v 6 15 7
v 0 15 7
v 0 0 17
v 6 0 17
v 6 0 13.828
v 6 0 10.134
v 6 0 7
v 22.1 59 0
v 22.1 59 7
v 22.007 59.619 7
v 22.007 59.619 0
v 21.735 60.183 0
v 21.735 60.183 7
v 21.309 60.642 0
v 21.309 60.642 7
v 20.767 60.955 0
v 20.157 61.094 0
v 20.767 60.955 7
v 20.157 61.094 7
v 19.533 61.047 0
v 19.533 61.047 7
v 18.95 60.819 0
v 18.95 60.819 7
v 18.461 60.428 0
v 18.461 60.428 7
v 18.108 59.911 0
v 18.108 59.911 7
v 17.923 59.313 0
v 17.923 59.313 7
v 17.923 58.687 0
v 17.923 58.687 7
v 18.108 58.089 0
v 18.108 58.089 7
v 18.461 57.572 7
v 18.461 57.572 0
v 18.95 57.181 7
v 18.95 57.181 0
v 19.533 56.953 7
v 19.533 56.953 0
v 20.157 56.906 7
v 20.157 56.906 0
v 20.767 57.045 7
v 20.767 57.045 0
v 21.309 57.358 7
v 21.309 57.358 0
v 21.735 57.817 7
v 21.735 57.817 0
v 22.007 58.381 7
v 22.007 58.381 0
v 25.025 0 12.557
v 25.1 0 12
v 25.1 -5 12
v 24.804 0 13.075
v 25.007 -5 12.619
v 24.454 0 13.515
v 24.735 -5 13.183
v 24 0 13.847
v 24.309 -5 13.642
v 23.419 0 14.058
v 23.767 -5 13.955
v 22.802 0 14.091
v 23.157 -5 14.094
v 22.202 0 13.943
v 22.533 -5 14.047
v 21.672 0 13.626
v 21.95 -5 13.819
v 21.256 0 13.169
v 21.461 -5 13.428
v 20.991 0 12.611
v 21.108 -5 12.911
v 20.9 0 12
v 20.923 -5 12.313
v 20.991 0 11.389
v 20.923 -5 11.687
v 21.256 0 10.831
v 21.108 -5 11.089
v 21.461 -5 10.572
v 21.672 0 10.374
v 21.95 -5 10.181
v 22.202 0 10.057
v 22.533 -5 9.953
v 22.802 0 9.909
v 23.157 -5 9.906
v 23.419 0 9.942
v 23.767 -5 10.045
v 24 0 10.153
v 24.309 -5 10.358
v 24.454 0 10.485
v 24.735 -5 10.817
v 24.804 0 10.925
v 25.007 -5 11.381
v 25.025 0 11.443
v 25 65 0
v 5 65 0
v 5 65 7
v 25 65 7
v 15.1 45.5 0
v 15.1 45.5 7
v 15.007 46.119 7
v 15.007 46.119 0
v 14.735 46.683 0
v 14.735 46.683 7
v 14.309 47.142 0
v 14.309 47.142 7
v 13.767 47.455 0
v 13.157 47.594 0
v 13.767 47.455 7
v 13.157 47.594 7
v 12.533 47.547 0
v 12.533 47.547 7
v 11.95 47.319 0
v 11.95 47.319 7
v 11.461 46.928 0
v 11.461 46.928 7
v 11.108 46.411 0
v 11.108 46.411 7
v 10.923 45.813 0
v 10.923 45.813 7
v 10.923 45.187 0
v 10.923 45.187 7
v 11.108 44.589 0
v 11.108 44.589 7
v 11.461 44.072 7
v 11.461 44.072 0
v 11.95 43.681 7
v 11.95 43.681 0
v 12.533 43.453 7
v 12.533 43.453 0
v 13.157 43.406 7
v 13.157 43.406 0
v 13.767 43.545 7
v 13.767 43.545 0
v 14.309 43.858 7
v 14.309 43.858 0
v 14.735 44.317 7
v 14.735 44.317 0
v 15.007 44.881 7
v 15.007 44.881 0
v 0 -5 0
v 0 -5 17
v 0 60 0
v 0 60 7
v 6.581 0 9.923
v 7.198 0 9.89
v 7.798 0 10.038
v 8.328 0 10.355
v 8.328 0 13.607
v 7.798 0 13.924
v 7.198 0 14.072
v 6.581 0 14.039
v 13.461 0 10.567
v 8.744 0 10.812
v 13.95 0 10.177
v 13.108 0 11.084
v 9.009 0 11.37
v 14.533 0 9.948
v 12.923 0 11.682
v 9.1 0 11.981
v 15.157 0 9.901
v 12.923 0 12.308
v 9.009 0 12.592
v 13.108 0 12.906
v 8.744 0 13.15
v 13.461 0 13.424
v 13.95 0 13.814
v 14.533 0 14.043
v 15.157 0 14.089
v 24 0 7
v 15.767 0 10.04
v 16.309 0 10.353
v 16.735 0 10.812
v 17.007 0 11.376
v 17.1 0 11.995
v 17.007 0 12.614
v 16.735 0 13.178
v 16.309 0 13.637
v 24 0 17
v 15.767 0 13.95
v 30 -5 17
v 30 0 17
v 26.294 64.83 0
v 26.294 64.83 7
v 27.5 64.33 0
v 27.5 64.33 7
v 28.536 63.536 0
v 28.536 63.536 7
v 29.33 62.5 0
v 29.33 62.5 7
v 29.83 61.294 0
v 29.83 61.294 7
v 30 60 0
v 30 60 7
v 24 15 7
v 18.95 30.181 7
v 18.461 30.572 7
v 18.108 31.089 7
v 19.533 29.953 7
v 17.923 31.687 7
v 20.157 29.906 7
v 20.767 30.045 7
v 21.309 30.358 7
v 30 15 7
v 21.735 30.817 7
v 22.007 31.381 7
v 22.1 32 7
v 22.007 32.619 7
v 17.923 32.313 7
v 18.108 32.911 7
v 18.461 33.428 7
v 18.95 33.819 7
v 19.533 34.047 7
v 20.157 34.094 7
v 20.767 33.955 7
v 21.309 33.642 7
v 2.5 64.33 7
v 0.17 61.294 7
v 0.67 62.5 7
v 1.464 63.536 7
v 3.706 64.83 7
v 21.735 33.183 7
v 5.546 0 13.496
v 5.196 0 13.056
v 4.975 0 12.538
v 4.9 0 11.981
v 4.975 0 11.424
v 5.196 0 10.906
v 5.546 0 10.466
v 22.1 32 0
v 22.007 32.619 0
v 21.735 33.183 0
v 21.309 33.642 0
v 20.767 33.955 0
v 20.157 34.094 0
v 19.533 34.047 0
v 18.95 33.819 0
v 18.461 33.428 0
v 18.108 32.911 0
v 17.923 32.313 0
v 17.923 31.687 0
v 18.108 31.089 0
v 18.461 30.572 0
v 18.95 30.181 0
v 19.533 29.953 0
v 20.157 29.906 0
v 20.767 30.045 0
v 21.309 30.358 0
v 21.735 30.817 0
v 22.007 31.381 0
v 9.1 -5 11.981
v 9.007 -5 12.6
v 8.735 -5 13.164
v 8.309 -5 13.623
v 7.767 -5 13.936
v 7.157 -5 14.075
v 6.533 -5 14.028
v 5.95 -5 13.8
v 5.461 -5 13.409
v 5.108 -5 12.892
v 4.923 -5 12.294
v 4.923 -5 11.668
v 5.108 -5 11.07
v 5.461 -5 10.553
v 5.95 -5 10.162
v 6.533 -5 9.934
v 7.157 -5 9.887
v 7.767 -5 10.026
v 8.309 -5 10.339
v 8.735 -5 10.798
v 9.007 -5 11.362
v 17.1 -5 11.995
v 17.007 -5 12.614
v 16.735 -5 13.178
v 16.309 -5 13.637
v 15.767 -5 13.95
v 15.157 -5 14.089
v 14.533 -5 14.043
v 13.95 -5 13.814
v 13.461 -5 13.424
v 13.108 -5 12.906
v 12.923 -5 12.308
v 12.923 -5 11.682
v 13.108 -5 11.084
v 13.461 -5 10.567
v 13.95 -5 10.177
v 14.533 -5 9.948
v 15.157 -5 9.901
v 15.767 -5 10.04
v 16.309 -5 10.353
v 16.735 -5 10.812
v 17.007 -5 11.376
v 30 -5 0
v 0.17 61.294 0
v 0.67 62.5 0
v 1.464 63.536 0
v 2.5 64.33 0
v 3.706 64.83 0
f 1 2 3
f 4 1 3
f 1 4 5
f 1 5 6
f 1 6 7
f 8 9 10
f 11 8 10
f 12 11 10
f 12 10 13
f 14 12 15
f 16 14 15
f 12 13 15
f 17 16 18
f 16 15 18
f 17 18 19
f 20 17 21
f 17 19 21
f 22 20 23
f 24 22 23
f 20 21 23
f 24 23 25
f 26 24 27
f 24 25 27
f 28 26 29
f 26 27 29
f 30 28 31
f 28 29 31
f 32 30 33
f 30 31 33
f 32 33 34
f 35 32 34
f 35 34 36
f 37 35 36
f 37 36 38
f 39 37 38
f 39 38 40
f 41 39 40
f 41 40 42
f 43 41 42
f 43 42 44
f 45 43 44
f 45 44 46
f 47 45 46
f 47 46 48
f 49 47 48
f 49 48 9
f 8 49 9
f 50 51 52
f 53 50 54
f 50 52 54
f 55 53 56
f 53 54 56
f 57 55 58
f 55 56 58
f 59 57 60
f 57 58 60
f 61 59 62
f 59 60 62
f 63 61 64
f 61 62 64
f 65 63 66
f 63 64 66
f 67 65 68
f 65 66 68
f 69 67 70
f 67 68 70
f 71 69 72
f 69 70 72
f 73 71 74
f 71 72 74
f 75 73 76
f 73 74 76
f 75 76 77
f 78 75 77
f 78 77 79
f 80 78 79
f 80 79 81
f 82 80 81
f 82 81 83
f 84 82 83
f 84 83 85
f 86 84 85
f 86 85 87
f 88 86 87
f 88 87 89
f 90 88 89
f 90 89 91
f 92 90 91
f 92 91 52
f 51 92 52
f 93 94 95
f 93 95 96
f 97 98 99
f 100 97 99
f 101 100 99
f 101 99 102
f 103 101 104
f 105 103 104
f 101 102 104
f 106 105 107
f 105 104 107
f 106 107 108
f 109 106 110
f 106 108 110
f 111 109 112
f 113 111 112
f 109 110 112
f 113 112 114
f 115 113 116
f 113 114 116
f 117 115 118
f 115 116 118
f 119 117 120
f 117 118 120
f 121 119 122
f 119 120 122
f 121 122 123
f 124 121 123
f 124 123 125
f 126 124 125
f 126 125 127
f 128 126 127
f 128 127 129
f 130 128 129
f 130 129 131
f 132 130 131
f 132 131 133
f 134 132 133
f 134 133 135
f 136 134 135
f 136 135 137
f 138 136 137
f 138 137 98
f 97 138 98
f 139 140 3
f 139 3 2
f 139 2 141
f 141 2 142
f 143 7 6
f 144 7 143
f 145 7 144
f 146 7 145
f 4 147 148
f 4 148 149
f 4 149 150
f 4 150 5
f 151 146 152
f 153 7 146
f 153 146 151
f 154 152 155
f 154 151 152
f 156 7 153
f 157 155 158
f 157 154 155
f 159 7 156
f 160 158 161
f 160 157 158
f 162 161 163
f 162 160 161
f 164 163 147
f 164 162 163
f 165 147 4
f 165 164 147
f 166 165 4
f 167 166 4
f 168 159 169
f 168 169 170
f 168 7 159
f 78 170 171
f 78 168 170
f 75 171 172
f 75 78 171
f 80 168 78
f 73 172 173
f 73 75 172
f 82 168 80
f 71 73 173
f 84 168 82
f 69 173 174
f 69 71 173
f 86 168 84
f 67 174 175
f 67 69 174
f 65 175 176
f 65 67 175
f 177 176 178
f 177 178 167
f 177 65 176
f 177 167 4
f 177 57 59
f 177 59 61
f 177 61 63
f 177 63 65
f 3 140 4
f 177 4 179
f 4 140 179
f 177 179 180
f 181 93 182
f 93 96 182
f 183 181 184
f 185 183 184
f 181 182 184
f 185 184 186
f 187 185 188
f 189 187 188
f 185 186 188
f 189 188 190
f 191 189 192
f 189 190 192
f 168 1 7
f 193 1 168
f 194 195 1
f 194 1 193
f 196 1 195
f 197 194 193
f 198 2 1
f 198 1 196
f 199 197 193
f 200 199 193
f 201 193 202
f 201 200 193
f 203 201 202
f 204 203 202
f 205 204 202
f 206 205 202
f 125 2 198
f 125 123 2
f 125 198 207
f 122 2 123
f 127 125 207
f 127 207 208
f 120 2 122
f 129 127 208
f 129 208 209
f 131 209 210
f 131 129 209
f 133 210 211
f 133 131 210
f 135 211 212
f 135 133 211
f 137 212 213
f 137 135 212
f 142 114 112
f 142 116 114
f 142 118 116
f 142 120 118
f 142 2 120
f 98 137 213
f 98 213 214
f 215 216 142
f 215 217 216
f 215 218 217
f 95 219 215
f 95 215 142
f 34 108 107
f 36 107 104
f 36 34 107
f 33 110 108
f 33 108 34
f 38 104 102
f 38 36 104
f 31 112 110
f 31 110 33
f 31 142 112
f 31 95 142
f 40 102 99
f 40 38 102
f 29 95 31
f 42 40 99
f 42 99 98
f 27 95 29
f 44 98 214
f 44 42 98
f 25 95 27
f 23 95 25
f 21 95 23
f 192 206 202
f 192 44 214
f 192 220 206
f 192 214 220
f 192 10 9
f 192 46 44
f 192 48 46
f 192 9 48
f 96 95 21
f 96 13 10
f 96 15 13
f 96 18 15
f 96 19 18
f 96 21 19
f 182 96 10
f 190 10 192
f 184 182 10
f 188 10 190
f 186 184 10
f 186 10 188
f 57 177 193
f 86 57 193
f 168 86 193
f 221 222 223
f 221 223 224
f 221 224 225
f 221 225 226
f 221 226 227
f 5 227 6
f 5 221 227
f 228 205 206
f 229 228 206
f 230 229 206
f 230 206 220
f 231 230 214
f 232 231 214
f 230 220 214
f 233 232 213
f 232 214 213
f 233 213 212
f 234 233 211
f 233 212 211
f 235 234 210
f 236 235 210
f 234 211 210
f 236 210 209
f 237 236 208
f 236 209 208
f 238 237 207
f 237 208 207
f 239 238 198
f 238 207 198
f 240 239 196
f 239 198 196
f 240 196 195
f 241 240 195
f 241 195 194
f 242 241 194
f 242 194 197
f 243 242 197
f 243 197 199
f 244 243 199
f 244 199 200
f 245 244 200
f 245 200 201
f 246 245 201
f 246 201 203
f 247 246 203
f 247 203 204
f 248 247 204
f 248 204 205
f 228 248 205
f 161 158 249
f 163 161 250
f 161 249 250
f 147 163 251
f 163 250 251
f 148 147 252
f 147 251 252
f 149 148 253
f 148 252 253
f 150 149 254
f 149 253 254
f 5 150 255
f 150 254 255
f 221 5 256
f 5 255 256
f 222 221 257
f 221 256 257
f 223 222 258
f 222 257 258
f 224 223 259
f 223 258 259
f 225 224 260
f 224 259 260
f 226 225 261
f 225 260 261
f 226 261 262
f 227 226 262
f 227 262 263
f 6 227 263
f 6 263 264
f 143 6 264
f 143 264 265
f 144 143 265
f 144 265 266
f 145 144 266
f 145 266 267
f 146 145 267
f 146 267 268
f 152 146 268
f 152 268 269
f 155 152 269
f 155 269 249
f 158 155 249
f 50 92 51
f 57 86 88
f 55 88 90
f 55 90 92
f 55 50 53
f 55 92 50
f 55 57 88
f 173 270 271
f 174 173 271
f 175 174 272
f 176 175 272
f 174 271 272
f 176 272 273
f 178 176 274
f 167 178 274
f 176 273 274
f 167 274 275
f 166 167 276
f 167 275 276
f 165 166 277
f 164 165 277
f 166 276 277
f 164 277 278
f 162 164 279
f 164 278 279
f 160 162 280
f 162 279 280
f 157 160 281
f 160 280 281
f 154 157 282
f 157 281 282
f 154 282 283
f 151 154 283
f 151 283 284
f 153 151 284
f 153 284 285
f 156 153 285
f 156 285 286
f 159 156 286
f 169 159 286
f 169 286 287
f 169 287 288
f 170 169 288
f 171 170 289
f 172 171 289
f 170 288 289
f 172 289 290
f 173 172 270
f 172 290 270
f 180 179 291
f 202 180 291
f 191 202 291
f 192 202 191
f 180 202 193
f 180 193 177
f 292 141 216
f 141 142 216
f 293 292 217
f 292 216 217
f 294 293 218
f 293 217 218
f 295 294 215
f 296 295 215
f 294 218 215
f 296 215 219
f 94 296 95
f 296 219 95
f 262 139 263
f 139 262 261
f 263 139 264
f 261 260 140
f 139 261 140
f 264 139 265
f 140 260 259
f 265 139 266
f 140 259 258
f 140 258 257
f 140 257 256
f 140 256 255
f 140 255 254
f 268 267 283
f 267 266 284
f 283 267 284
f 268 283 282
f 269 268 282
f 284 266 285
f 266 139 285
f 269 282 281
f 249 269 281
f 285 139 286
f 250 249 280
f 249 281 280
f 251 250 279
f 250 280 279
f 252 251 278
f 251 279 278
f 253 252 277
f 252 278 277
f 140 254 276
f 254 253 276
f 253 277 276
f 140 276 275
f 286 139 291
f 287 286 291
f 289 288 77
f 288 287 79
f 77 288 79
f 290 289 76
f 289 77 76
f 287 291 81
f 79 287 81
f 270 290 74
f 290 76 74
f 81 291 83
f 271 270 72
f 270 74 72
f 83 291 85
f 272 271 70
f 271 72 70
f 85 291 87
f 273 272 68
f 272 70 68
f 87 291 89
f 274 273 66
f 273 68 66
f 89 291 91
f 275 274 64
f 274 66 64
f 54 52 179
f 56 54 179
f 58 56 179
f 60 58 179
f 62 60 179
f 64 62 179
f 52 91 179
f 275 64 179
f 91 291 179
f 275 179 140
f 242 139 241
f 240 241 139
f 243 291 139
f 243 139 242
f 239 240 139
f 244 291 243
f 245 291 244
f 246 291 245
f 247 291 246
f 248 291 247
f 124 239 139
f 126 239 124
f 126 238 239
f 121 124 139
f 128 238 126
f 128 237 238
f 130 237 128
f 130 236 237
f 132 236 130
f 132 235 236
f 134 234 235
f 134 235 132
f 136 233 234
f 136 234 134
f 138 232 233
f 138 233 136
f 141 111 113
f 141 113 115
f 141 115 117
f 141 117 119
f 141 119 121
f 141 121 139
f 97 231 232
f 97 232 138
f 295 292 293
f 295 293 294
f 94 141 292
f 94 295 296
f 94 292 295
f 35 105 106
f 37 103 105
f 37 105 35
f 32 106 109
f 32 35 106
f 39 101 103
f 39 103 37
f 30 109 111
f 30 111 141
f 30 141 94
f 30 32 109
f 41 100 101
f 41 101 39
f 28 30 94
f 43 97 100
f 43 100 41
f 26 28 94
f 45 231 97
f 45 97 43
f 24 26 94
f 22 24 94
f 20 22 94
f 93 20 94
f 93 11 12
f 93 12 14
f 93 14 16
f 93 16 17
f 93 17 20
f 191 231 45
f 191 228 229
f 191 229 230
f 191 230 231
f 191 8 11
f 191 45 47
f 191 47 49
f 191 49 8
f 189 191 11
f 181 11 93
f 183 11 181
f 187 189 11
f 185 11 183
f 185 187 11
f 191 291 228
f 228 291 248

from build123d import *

# Parameters (mm, degrees)
SKETCH_W        = 30
SKETCH_H        = 65
PAD_DEPTH       = 7
SKETCH001_W     = 5
SKETCH001_H     = 17
PAD001_DEPTH    = 30
PAD002_DEPTH    = 6
PAD003_DEPTH    = 6
SKETCH004_R     = 2.1
POCKET_DEPTH    = 12
SKETCH005_R     = 2.1
POCKET001_DEPTH = 5
FILLET_R        = 5


with BuildPart() as part:
    # Sketch → Pad (new body)
    with BuildSketch(Plane.XY):
        with Locations((15, 32.5)):
            Rectangle(SKETCH_W, SKETCH_H)
    extrude(amount=PAD_DEPTH)

    # Sketch001 (on DatumPlane) → Pad001 (join)
    with BuildSketch(Plane.YZ.offset(30)):
        with Locations((-2.5, 8.5)):
            Rectangle(SKETCH001_W, SKETCH001_H)
    extrude(amount=-PAD001_DEPTH)

    # Sketch002 (on DatumPlane) → Pad002 (join)
    with BuildSketch(Plane.YZ.offset(30)):
        Polygon((0, 17), (0, 7), (15, 7), align=None)
    extrude(amount=-PAD002_DEPTH)

    # Sketch003 (on DatumPlane) → Pad003 (join)
    with BuildSketch(Plane(origin=(0, 0, 0), x_dir=(0, -1, 0), z_dir=(-1, 0, 0))):
        Polygon((0, 17), (0, 7), (-15, 7), align=None)
    extrude(amount=-PAD003_DEPTH)

    # Sketch004 (on Face6 of Pad003) → Pocket (cut)
    with BuildSketch(Plane.XY.offset(7)):
        with Locations((20, 59)):
            Circle(SKETCH004_R)
        with Locations((20, 32)):
            Circle(SKETCH004_R)
        with Locations((13, 45.5)):
            Circle(SKETCH004_R)
    extrude(amount=-POCKET_DEPTH, mode=Mode.SUBTRACT)

    # Sketch005 (on Face8 of Pocket) → Pocket001 (cut)
    with BuildSketch(Plane.XZ.offset(5)):
        with Locations((7.000014, 11.981068)):
            Circle(SKETCH005_R)
        with Locations((15.000001, 11.995259)):
            Circle(SKETCH005_R)
        with Locations((23, 12)):
            Circle(SKETCH005_R)
    extrude(amount=-POCKET001_DEPTH, mode=Mode.SUBTRACT)

    # Fillet
    fillet_edges = [part.edges().sort_by_distance(p)[0] for p in [
        (0, 65, 3.5),
        (30, 65, 3.5),
    ]]
    fillet(fillet_edges, radius=FILLET_R)


solid = part.part
